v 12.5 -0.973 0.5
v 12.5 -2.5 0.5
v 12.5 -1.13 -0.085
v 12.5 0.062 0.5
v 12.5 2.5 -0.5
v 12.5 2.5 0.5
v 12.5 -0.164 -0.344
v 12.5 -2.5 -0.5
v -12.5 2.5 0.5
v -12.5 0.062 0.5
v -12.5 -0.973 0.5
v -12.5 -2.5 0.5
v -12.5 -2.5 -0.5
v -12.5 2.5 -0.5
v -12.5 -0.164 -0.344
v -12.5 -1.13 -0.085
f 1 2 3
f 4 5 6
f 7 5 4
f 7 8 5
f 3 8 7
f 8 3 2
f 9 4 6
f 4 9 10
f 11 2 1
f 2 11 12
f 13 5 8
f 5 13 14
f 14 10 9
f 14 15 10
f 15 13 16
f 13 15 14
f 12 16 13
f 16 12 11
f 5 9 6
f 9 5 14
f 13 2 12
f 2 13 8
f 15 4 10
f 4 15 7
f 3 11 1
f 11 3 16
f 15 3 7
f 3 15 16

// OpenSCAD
difference(){
cube([25,5,1],center=true);
translate([0,0,2.2])
rotate([75,0,0])
cube([44,5,1],center=true);
}
